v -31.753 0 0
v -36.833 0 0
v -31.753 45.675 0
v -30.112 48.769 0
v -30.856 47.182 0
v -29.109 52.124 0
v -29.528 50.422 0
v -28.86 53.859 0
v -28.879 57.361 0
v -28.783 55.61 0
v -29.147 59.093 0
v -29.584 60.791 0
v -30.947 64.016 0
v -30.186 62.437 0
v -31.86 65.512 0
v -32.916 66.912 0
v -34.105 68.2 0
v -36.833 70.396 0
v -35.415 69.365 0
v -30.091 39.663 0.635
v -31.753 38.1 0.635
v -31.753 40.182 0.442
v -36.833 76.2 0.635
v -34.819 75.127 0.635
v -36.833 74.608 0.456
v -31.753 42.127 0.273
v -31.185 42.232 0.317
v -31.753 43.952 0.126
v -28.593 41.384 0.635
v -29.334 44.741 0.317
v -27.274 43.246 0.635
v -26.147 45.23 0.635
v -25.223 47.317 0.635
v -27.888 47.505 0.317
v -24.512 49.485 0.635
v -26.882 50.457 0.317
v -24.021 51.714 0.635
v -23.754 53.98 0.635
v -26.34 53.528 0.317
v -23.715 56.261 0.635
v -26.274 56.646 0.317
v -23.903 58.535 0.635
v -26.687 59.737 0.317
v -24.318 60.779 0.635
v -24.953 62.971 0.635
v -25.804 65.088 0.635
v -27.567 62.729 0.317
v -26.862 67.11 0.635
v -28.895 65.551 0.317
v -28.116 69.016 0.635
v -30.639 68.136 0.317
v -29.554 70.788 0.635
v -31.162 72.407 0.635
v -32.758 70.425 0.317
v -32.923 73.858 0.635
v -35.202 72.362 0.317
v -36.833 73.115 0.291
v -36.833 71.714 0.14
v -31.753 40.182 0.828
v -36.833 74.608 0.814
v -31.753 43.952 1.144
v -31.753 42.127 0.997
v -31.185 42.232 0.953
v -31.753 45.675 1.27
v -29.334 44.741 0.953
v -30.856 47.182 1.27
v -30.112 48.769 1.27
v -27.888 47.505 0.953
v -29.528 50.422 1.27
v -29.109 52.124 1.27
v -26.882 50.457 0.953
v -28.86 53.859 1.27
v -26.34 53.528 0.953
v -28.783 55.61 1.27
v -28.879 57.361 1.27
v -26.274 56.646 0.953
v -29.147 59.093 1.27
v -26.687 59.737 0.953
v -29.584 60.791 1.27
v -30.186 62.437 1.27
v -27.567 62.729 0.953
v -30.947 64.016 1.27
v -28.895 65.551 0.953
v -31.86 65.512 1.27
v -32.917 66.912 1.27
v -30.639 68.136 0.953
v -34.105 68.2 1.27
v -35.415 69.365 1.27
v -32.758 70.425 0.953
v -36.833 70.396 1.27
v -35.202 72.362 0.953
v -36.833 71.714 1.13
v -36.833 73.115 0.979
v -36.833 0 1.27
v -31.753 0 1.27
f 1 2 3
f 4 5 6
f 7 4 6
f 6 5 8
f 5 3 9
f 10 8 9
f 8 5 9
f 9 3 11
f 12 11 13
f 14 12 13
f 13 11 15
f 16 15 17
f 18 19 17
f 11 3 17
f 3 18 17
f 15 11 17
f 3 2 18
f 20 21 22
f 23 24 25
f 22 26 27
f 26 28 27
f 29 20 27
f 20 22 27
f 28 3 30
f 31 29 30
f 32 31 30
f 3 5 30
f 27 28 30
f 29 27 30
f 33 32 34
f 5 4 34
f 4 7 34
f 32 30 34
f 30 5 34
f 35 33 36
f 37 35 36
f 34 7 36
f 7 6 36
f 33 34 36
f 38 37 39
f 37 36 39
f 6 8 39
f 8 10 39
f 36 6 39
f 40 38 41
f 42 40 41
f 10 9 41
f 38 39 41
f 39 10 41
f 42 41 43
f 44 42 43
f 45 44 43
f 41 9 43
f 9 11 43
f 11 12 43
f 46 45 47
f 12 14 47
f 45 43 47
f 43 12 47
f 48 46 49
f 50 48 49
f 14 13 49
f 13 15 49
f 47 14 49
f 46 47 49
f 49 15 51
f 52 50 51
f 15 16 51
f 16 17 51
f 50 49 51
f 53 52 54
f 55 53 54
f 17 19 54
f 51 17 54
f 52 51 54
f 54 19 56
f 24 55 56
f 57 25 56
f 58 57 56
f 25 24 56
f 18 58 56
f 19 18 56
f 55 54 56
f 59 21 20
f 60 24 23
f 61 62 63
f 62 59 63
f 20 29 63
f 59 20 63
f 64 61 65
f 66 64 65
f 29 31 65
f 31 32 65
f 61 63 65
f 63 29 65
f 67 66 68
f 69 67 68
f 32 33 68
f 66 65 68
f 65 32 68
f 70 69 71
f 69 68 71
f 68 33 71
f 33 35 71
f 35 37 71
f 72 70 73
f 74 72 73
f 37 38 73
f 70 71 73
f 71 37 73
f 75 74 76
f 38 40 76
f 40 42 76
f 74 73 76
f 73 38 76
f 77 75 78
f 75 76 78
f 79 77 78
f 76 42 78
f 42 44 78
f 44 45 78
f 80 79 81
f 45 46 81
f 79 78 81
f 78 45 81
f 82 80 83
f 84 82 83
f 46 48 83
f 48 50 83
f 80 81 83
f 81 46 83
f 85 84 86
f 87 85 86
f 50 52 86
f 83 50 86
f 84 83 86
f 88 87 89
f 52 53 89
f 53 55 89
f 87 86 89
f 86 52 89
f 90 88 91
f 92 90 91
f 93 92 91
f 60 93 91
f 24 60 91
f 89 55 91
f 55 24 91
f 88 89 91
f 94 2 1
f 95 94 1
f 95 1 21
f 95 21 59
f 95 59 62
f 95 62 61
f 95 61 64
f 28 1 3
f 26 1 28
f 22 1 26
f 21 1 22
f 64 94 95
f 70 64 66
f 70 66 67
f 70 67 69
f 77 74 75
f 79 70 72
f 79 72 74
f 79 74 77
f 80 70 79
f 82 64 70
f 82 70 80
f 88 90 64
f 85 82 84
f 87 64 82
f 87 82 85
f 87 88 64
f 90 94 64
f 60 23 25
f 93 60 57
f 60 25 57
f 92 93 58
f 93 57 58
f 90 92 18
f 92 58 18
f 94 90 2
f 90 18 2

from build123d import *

# Parameters (mm, degrees)
F1_DEPTH = 1.27
F2_SIZE2 = 0.635
F2_SIZE  = 5.08
F3_SIZE2 = 5.07999
F3_SIZE  = 0.63499


# Not quite as in the source:
# - a fillet or chamfer is up to 0.001 mm smaller than in the source, because OpenCascade refuses the exact size


with BuildPart() as f1:
    # F0 (on Top) → F1 (new body)
    with BuildSketch(Plane.XY):
        with BuildLine():
            Line((-36.8330654015, 25.4), (-36.8330654015, 0))
            Line((-36.8330654015, 0), (-31.7530654015, 0))
            Line((-31.7530654015, 0), (-31.7530654015, 25.4))
            Line((-31.7530654015, 25.4), (-31.7530654015, 38.1))
            ThreePointArc((-31.7530654015, 38.1), (-23.9034396028, 58.5352834398), (-36.8330654015, 76.2))
            Line((-36.8330654015, 76.2), (-36.8330654015, 25.4))
        make_face()
    extrude(amount=F1_DEPTH)

    # F2
    f2_edges = [f1.edges().sort_by_distance(p)[0] for p in [
        (-23.90344, 58.535283, 1.27),
    ]]
    f2_side = f1.faces().sort_by_distance((-32.33426, 43.519124, 1.27))[0]
    chamfer(f2_edges, length=F2_SIZE, length2=F2_SIZE2, reference=f2_side)

    # F3 (size 0.635 and 5.08 in the source; OpenCascade refuses exactly that, so slightly less here)
    f3_edges = [f1.edges().sort_by_distance(p)[0] for p in [
        (-23.90344, 58.535283, 0),
    ]]
    f3_side = f1.faces().sort_by_distance((-23.90344, 58.535283, 0.3175))[0]
    chamfer(f3_edges, length=F3_SIZE, length2=F3_SIZE2, reference=f3_side)


solid = f1.part
